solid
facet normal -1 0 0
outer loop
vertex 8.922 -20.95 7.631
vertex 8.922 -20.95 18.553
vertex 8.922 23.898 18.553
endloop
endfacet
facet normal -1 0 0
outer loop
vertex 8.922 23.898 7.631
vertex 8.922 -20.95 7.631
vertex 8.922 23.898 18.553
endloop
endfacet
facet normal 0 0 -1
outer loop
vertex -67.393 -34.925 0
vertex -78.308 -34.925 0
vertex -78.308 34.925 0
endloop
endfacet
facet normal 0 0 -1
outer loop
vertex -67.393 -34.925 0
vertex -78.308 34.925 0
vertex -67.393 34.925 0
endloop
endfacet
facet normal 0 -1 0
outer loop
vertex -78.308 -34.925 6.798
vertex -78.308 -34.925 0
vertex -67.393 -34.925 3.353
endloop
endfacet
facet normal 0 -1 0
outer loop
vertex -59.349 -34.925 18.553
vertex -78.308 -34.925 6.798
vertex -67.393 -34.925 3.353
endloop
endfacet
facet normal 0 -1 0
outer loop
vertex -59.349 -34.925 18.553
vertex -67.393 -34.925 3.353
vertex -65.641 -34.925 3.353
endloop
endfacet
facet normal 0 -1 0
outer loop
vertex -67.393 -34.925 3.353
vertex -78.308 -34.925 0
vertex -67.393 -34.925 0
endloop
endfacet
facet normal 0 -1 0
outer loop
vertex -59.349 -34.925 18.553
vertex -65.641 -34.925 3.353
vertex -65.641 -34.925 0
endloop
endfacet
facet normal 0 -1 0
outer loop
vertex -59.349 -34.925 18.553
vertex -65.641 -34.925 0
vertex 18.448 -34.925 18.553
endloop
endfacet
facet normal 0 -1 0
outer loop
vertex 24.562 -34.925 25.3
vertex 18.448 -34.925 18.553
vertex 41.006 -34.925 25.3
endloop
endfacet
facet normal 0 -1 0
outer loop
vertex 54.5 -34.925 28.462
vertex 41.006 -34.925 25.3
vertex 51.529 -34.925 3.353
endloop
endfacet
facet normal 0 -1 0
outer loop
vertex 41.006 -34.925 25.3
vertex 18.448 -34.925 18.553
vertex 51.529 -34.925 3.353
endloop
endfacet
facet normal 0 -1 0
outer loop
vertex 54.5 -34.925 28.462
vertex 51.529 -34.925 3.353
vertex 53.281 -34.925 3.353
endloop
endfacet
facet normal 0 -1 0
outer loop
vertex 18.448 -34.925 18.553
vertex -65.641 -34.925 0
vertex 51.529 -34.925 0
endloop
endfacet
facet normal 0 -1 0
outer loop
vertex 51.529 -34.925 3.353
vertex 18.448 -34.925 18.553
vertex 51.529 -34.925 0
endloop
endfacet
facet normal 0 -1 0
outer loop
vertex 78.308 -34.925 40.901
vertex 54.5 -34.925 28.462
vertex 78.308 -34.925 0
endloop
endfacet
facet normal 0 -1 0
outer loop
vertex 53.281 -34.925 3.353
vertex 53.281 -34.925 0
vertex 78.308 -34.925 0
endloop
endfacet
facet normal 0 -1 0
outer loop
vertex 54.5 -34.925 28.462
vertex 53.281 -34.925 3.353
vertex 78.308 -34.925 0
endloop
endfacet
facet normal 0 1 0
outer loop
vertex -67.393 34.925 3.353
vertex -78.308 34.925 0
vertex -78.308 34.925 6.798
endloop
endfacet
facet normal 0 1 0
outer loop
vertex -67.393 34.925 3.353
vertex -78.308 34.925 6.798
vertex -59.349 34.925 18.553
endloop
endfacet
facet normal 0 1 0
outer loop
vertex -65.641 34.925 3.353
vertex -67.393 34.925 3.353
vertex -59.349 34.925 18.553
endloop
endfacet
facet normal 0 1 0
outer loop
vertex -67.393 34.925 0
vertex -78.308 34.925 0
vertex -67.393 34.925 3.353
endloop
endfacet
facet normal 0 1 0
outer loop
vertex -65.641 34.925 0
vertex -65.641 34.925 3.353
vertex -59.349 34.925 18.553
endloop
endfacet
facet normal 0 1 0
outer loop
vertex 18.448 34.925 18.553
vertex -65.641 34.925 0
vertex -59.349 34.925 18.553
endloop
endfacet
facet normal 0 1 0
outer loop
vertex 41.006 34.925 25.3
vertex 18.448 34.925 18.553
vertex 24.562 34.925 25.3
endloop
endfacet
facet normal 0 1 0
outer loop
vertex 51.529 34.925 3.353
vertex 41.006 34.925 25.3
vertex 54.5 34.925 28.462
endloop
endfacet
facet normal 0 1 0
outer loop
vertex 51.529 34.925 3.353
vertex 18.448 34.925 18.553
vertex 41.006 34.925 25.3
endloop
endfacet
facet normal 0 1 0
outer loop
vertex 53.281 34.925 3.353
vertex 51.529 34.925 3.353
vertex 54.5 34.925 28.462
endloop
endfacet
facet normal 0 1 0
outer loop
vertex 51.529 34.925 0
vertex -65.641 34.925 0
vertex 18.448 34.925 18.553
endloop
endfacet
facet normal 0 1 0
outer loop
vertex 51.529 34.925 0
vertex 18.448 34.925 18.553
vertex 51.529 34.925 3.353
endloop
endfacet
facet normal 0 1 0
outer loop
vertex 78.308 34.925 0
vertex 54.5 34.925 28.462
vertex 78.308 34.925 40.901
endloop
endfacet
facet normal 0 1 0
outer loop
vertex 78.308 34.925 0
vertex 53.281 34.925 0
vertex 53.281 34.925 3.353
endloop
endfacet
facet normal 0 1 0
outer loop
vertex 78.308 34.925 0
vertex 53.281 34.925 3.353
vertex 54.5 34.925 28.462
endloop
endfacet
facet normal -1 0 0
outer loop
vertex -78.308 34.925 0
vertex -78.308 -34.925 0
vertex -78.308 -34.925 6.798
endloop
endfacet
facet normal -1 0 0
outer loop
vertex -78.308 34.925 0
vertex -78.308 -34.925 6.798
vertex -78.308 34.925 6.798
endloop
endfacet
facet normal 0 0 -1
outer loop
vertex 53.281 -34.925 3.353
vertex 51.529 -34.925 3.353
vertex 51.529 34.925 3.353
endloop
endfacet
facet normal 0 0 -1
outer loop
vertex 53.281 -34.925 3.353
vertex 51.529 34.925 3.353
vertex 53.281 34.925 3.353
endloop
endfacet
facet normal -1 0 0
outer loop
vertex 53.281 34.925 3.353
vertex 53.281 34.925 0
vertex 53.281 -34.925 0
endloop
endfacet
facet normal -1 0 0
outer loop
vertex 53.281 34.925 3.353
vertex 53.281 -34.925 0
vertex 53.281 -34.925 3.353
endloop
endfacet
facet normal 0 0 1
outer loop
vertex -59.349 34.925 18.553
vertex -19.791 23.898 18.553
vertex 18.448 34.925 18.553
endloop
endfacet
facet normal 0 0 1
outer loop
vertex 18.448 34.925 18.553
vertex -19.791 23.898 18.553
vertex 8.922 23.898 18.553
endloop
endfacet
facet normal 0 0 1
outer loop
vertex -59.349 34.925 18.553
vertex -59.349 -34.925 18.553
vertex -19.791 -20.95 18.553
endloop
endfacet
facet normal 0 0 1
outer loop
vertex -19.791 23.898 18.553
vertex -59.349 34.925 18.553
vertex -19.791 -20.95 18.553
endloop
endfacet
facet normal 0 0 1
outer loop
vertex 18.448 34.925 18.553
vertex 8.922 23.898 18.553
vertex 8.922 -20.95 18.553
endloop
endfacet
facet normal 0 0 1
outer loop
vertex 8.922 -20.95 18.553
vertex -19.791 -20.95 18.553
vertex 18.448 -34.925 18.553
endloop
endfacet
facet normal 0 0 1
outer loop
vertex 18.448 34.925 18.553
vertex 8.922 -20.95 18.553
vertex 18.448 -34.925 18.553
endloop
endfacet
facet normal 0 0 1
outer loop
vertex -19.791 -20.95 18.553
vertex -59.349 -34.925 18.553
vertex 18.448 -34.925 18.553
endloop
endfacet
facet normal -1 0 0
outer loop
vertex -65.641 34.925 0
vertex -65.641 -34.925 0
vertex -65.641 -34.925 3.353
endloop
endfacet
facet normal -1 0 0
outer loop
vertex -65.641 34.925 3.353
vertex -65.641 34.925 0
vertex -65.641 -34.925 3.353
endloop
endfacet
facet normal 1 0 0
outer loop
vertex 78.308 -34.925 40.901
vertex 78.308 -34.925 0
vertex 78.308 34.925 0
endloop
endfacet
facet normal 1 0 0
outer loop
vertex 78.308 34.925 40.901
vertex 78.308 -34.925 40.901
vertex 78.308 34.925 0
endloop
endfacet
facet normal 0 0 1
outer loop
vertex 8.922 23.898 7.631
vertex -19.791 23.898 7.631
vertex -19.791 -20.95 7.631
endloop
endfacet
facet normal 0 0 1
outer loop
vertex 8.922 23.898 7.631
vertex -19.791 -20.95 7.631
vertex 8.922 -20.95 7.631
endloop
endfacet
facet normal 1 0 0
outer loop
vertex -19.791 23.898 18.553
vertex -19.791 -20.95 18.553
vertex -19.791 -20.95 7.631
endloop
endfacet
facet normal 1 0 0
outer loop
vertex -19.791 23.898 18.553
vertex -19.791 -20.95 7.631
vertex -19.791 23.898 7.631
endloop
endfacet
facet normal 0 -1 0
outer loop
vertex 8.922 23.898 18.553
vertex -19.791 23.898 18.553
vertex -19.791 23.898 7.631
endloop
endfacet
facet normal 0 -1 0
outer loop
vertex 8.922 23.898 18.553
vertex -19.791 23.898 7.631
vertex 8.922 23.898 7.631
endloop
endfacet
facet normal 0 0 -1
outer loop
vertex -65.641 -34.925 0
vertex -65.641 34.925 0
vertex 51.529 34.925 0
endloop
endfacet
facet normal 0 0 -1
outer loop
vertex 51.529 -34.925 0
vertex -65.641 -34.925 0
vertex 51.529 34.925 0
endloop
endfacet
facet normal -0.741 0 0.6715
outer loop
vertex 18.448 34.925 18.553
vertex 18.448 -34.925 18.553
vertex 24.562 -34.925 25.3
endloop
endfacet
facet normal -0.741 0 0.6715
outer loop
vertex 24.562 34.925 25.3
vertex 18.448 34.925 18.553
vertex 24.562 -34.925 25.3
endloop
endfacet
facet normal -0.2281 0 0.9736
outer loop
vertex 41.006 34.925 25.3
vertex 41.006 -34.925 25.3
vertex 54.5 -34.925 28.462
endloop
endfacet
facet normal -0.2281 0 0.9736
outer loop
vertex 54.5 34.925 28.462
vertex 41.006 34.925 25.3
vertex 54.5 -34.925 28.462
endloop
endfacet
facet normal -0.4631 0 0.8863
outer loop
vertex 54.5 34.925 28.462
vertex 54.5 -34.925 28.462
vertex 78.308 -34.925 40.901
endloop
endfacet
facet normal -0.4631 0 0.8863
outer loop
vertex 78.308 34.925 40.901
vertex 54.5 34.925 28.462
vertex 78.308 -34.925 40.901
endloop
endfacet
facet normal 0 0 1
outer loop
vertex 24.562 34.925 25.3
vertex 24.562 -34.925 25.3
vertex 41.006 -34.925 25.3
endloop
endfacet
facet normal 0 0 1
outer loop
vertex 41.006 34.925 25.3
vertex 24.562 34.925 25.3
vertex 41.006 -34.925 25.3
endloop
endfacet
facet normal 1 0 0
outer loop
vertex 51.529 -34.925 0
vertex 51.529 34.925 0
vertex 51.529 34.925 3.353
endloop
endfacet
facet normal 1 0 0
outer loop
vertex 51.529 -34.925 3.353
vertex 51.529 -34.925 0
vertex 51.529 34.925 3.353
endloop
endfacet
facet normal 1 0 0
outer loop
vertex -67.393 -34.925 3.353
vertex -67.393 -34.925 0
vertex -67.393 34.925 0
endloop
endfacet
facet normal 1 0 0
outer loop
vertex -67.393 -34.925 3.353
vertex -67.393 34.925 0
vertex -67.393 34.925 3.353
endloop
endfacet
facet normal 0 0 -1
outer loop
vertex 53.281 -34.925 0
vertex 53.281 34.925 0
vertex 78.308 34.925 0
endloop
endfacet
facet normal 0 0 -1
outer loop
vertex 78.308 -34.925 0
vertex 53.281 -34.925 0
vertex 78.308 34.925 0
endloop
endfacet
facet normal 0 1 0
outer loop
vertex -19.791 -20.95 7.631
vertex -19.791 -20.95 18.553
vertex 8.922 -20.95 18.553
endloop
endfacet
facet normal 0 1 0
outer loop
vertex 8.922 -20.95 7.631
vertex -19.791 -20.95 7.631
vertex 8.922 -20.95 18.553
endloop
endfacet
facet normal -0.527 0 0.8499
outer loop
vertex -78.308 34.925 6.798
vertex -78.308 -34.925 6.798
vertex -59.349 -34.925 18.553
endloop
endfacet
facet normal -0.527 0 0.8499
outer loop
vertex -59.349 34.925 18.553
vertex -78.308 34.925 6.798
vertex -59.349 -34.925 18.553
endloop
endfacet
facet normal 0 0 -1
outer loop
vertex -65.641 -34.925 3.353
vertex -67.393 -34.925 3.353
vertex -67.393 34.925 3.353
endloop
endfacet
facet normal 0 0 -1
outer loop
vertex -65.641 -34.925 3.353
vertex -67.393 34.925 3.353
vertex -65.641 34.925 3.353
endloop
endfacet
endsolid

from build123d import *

# Parameters (mm, degrees)
F0_W     = 156.6164
F0_H     = 69.85
F1_DEPTH = 50.8
F3_DEPTH = 90.424
F4_W     = 28.712457
F4_H     = 44.847306
F5_DEPTH = 10.922
F6_W     = 1.7526
F6_H     = 6.634839
F7_DEPTH = 123.1646
F8_W     = 1.7526
F8_H     = 8.506187
F9_DEPTH = 74.7776


with BuildPart() as f1:
    # F0 (on Top) → F1 (new body)
    with BuildSketch(Plane.XY):
        Rectangle(F0_W, F0_H)
    extrude(amount=F1_DEPTH)

    # F2 (on face) → F3 (cut)
    with BuildSketch(Plane.XZ.offset(34.925)):
        Polygon((-96.243918, 45.539286), (-80.431662, 5.481581), (-59.348658, 18.553045), (-30.254111, 18.553045), (18.44763, 18.553045), (24.561701, 25.299605), (41.006446, 25.299605), (54.499563, 28.462056), (78.3082, 40.901028), (84.015772, 52.707508), (-62.089447, 67.676447), align=None)
    extrude(amount=-F3_DEPTH, mode=Mode.SUBTRACT)

    # F4 (on face) → F5 (cut)
    with BuildSketch(Plane.XY.offset(18.553045)):
        with Locations((-5.434541, 1.473863)):
            Rectangle(F4_W, F4_H)
    extrude(amount=-F5_DEPTH, mode=Mode.SUBTRACT)

    # F6 (on face) → F7 (cut)
    with BuildSketch(Plane.XZ.offset(34.925)):
        with Locations((-66.516876, 0.035381)):
            Rectangle(F6_W, F6_H)
    extrude(amount=-F7_DEPTH, mode=Mode.SUBTRACT)

    # F8 (on face) → F9 (cut)
    with BuildSketch(Plane.XZ.offset(34.925)):
        with Locations((52.404836, -0.900293)):
            Rectangle(F8_W, F8_H)
    extrude(amount=-F9_DEPTH, mode=Mode.SUBTRACT)


solid = f1.part
